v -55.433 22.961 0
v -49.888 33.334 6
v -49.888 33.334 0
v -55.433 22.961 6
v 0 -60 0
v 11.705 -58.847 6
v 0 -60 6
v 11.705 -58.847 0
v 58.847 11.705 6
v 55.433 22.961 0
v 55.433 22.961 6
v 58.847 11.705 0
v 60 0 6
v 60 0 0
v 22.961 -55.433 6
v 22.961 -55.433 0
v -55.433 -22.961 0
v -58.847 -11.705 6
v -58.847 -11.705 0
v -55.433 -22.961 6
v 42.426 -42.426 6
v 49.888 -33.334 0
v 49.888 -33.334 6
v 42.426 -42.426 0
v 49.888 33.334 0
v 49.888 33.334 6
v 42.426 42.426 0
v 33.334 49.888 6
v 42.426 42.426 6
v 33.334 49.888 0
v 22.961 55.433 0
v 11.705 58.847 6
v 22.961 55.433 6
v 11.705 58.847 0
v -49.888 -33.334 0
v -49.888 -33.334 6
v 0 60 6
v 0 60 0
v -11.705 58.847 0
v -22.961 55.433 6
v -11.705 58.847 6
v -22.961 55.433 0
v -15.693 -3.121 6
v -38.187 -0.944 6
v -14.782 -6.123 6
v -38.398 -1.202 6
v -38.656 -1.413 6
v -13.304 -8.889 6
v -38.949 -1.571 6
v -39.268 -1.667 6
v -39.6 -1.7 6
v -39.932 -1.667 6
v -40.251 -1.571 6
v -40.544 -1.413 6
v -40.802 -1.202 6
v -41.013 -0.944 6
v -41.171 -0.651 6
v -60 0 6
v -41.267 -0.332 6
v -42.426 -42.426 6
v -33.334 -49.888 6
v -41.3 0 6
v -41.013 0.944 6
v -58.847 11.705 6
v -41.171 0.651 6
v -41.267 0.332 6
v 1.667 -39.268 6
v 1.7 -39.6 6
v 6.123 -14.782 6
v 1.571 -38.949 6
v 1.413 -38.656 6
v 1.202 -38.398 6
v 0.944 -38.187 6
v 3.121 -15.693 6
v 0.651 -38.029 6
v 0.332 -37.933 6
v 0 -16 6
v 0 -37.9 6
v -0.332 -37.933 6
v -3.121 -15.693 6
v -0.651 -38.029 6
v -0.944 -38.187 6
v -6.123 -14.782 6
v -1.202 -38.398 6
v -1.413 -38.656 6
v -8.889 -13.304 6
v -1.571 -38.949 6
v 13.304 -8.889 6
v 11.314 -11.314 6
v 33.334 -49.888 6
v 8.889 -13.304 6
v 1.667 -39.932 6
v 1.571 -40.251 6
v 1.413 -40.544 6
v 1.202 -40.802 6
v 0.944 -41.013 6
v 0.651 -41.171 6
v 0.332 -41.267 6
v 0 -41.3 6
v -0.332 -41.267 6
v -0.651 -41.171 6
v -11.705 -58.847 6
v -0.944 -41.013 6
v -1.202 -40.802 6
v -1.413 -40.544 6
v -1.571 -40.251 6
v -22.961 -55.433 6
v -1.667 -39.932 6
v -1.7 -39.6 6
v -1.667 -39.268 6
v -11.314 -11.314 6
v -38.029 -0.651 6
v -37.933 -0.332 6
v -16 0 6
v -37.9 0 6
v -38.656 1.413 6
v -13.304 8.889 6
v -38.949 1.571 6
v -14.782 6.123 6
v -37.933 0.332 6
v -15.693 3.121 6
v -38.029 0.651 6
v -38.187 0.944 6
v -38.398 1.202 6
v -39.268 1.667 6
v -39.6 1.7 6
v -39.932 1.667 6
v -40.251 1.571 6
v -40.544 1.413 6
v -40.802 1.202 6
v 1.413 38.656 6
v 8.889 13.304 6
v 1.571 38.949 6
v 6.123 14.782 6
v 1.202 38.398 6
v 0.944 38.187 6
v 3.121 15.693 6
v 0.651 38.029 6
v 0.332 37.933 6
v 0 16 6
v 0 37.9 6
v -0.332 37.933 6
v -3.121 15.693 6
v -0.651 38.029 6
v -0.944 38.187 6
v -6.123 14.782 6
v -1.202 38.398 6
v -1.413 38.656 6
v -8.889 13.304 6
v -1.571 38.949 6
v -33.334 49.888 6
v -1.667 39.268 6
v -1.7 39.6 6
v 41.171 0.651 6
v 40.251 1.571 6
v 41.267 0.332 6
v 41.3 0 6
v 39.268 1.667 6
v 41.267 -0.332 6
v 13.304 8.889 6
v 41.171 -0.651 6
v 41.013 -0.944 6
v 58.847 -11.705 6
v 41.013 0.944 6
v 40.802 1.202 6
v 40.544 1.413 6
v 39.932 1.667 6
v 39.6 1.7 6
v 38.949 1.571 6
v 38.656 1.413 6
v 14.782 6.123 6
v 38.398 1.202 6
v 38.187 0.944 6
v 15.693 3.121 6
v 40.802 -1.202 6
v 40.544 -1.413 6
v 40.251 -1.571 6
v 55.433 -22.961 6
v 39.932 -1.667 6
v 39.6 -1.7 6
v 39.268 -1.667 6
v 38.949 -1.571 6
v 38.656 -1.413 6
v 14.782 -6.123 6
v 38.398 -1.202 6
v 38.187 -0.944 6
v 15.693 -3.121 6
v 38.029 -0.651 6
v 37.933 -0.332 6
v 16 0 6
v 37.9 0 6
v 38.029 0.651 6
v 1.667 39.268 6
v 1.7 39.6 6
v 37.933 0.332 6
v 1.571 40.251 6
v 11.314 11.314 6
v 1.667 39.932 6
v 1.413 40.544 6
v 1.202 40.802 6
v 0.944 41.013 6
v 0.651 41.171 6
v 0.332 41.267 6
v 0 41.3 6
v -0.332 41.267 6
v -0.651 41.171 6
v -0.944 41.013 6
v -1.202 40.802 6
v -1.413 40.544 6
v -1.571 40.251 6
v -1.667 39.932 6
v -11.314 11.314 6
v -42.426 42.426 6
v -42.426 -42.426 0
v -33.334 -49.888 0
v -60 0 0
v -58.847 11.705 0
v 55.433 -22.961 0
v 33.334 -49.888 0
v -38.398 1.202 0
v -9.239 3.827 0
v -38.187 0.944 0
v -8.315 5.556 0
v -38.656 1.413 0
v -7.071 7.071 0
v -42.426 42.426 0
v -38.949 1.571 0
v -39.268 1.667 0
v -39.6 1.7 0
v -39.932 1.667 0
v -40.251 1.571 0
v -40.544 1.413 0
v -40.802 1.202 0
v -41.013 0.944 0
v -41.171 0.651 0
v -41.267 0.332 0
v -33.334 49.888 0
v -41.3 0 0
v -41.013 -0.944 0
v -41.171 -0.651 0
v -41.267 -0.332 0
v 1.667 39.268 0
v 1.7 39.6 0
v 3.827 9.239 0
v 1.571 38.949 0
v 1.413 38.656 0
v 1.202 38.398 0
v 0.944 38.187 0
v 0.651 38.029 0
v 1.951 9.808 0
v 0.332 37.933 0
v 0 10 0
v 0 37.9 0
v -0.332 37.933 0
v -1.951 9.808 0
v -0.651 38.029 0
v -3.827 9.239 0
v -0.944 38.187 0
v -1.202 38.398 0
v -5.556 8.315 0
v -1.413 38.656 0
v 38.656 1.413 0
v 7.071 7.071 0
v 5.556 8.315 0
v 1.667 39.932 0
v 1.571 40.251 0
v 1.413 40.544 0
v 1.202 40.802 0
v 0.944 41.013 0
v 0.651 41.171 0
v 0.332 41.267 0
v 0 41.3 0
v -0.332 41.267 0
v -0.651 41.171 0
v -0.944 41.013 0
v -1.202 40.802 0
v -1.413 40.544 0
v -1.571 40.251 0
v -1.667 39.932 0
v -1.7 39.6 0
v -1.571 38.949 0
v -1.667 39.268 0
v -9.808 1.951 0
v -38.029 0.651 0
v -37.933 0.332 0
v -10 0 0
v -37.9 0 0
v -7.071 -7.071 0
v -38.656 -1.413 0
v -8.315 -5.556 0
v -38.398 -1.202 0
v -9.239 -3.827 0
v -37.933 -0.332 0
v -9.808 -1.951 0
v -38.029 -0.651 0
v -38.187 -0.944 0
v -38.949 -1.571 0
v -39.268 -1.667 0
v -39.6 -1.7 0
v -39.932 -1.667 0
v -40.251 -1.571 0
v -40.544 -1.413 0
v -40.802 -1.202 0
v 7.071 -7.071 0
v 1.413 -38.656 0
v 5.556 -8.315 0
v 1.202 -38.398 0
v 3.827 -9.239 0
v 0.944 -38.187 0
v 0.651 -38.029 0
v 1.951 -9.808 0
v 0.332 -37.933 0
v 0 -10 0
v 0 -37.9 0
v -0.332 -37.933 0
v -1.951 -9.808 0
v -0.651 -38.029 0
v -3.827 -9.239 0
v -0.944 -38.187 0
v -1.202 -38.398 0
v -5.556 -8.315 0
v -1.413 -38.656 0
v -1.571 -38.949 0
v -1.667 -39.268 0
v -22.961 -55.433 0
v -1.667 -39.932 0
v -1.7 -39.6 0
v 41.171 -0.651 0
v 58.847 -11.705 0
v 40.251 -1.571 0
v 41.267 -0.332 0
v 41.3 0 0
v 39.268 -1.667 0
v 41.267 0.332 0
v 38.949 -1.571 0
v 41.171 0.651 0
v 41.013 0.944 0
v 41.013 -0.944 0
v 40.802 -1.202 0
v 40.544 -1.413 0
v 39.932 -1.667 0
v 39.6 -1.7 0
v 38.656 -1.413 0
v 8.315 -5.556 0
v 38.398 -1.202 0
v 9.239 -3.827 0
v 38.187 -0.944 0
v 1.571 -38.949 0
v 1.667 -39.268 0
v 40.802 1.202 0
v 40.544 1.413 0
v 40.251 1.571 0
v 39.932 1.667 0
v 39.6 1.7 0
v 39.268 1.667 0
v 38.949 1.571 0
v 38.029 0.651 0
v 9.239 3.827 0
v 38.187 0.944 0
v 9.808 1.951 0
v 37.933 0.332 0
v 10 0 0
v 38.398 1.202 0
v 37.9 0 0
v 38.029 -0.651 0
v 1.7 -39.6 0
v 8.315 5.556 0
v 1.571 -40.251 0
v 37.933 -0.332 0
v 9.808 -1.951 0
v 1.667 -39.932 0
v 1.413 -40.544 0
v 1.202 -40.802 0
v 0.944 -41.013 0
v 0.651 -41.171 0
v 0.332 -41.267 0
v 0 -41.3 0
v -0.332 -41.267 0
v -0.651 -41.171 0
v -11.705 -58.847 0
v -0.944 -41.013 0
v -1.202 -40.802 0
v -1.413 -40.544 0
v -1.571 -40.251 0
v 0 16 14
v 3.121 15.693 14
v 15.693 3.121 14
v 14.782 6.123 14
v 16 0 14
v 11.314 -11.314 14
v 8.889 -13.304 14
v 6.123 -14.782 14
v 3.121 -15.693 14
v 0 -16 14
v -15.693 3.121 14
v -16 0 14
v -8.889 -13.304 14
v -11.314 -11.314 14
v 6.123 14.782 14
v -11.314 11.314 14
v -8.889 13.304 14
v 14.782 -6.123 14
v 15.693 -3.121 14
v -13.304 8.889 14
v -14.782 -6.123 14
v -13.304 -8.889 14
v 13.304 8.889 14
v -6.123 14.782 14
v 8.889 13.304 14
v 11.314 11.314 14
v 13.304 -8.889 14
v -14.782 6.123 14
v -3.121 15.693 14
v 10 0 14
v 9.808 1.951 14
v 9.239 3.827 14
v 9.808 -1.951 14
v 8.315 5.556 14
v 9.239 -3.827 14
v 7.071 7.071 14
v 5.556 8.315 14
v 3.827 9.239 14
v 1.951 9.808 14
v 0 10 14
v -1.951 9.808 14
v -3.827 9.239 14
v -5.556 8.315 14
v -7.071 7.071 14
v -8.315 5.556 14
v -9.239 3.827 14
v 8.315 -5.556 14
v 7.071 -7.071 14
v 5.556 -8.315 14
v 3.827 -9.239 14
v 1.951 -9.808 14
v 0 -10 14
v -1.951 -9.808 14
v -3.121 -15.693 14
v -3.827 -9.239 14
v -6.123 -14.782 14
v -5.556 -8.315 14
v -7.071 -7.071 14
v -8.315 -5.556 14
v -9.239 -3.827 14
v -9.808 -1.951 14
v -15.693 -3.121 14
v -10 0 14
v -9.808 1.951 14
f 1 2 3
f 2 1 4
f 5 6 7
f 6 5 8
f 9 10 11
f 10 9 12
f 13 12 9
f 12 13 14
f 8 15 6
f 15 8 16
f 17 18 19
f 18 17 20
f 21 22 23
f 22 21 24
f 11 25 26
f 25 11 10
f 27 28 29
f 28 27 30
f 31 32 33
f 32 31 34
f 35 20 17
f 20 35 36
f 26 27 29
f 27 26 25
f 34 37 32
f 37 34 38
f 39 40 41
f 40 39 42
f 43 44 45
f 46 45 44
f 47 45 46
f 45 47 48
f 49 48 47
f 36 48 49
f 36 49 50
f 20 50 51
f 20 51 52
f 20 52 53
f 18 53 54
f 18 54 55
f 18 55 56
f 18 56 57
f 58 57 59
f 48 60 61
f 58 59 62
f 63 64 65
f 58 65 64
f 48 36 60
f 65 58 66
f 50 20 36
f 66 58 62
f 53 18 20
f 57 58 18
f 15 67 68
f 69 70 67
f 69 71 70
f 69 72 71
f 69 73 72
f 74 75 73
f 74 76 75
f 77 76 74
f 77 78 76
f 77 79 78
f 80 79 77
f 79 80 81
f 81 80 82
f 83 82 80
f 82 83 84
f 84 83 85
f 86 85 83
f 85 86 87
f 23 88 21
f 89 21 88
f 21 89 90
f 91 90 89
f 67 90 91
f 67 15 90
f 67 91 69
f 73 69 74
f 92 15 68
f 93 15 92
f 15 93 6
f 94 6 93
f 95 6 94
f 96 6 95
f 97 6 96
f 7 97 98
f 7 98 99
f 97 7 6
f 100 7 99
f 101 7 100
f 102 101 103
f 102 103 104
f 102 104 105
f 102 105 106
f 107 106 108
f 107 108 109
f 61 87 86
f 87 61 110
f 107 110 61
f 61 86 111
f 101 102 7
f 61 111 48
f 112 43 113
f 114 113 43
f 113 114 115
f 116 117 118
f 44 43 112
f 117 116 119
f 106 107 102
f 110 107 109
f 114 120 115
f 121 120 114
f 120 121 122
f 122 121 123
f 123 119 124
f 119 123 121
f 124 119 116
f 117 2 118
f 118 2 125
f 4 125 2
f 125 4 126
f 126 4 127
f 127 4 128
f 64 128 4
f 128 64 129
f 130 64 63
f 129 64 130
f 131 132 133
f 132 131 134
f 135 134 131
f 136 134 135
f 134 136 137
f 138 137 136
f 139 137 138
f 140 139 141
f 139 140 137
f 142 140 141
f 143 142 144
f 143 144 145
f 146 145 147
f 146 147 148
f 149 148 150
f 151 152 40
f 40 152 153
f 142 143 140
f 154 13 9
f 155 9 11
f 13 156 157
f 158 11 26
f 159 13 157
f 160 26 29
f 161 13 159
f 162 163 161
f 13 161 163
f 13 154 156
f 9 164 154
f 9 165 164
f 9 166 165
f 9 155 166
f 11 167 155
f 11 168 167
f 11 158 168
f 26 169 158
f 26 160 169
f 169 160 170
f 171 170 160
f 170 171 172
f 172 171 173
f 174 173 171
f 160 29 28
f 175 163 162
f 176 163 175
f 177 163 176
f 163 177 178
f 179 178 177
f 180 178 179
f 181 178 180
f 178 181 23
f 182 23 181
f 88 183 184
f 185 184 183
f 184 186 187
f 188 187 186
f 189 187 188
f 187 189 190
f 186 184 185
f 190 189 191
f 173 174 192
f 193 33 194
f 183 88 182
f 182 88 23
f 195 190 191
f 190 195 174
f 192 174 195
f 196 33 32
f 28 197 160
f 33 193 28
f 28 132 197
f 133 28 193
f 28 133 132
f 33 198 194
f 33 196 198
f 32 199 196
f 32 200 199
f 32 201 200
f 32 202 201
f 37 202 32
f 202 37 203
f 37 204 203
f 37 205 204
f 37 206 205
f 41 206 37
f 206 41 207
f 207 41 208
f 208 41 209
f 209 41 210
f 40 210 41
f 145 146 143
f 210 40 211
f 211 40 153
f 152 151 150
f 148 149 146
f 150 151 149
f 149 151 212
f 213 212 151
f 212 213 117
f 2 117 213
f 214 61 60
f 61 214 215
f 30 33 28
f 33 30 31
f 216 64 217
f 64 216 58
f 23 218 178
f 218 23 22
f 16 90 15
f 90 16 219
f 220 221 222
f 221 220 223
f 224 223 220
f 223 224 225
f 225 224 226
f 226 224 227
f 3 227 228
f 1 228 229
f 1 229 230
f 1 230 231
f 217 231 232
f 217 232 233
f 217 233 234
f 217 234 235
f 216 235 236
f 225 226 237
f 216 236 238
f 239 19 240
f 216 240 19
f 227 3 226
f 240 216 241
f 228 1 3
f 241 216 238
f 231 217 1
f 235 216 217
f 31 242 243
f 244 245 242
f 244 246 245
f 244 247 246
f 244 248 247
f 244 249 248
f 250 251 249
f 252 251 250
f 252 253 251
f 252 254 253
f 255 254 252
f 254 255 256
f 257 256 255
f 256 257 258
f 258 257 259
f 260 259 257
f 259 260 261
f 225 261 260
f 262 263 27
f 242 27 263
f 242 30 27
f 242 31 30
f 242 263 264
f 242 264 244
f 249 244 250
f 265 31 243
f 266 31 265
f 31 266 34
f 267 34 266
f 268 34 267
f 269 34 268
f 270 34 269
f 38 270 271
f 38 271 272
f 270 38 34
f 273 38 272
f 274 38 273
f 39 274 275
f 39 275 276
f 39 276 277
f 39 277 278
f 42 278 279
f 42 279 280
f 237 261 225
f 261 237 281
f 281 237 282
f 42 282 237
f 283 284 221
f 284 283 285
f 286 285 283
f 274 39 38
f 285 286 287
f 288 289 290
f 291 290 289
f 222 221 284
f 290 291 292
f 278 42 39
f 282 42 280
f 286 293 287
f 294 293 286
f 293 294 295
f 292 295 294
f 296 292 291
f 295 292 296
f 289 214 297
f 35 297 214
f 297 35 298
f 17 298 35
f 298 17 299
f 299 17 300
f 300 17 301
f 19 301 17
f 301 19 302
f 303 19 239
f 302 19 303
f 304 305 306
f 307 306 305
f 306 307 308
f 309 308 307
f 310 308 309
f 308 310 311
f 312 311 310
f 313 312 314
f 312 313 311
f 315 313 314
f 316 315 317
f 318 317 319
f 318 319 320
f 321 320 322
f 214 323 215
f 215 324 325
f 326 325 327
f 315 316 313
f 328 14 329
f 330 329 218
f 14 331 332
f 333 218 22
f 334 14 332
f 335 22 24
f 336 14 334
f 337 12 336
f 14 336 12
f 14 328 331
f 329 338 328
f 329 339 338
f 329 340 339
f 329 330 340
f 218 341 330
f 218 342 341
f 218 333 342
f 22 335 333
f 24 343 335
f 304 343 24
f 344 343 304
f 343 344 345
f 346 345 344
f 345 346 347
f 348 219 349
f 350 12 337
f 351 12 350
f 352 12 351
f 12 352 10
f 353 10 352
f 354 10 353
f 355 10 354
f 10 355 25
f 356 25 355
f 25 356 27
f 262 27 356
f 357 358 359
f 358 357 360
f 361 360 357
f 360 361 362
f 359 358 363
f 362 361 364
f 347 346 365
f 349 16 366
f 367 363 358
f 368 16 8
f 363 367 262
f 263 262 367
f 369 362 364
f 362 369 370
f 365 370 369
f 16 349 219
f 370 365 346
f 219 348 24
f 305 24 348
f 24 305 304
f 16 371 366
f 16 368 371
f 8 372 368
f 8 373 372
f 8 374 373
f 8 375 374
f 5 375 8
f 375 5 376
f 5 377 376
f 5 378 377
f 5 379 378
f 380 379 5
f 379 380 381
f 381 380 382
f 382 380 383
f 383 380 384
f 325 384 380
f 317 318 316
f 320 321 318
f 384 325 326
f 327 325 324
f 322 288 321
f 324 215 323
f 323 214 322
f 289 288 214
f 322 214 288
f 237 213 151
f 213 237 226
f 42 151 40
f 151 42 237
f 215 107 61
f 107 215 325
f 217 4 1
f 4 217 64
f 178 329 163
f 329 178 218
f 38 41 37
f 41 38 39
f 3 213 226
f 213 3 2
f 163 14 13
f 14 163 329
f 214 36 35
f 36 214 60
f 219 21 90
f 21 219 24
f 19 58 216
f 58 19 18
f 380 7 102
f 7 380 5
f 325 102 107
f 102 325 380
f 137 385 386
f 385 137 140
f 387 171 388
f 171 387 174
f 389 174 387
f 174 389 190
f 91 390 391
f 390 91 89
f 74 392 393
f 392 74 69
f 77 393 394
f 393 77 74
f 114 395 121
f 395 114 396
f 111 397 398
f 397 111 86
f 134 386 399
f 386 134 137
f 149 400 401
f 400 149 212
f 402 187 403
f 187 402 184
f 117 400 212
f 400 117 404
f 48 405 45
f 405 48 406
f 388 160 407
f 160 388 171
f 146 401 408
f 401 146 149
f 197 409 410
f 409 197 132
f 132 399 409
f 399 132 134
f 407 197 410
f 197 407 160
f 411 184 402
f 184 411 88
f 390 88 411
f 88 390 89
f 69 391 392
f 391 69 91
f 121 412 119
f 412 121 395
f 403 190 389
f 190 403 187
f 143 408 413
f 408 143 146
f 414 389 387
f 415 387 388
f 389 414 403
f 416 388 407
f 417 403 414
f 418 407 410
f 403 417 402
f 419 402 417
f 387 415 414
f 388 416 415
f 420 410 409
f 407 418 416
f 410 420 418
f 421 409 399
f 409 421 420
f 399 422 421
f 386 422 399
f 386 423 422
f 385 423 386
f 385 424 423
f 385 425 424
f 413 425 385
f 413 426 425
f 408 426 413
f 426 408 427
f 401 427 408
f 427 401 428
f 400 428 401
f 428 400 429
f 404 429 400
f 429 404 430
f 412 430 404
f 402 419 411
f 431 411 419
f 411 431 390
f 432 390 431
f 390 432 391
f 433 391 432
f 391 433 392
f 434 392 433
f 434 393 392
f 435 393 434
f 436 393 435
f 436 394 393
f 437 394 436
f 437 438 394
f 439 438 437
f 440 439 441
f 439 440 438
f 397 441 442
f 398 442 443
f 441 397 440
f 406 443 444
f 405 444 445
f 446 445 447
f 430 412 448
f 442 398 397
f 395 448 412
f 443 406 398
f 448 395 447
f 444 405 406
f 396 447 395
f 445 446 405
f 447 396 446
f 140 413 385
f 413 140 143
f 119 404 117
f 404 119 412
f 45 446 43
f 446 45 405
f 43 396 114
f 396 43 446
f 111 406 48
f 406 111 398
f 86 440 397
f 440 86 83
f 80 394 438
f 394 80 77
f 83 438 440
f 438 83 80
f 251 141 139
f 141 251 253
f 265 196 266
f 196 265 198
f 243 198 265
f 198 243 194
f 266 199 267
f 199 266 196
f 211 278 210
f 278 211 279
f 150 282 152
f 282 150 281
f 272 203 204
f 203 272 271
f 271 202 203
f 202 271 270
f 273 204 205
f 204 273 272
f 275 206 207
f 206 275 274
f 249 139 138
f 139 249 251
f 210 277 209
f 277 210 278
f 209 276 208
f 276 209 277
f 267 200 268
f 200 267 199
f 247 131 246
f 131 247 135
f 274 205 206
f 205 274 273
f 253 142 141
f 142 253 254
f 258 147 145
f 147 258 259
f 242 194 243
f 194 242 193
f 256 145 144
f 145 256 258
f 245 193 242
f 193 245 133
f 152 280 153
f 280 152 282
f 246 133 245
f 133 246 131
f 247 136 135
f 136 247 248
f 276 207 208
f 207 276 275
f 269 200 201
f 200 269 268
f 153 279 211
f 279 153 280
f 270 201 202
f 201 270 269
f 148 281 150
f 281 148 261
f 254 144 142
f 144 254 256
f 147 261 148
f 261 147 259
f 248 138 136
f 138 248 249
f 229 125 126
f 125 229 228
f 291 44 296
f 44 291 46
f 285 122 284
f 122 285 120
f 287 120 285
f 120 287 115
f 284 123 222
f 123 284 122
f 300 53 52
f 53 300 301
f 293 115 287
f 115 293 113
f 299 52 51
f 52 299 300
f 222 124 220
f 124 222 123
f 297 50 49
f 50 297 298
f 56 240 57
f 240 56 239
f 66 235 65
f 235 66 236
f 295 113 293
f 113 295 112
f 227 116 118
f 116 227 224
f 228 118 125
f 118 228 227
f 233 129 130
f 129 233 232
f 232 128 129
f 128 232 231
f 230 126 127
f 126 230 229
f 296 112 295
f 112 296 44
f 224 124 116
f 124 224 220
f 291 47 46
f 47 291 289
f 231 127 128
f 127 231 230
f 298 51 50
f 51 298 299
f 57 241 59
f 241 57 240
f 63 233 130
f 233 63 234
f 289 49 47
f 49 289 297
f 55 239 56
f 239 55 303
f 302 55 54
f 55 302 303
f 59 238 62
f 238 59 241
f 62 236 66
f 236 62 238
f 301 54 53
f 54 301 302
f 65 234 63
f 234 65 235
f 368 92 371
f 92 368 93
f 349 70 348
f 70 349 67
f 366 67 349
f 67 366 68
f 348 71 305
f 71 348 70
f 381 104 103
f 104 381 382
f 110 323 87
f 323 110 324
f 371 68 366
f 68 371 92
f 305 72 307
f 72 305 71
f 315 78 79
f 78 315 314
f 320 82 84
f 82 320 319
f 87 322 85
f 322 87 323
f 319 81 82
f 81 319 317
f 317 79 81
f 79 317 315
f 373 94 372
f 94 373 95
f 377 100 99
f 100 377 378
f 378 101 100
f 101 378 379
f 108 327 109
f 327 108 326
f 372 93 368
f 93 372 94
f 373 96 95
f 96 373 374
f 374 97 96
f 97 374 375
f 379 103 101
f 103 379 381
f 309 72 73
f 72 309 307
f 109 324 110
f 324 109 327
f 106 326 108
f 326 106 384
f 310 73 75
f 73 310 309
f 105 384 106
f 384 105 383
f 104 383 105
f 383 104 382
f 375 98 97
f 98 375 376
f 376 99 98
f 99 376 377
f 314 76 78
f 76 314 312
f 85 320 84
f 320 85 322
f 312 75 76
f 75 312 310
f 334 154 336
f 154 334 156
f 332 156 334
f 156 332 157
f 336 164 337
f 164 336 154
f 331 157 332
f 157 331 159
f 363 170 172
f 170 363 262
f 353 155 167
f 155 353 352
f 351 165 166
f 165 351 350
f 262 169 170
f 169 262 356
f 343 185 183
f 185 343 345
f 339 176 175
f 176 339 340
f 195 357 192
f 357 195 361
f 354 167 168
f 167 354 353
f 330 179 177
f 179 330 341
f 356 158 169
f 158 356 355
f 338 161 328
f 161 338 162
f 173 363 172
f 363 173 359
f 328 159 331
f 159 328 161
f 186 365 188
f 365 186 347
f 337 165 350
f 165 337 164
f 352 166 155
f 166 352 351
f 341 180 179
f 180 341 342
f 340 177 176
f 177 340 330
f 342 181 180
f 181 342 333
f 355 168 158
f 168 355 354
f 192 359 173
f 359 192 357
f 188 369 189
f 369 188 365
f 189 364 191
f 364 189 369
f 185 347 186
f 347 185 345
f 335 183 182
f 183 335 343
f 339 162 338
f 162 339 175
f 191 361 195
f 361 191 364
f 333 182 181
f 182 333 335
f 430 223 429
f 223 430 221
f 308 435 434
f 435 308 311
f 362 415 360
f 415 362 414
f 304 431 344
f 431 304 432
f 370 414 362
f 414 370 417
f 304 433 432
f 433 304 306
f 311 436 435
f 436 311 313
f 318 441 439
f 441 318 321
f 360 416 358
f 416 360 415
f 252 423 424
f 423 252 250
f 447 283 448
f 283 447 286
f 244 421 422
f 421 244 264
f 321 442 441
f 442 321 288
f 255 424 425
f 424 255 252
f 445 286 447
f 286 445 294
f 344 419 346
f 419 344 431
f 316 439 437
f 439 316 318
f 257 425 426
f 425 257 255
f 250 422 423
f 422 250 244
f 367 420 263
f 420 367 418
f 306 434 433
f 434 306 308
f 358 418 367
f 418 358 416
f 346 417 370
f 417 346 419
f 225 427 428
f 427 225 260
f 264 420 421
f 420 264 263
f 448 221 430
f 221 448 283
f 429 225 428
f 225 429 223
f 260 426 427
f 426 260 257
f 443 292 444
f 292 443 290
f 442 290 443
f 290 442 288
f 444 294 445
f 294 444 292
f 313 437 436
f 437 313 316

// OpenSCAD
$fn = 32;

// ----------------------------------------------------------------------
// Flange Ø120 x 6
// 4 holes on a Ø79.2 bolt circle, bolted joints
// ----------------------------------------------------------------------

// --- parameters (mm) ---
flange_d = 120;  // outside diameter of the flange
thickness = 6;   // flange thickness
holes = 4;       // number of bolt holes
pcd = 79.2;      // bolt circle diameter
start_deg = 90;  // angle of the first hole, from +X
hole_d = 3.4;    // bolt hole diameter
bore_d = 20;     // central through bore
hub_d = 32;      // hub outside diameter
hub_h = 8;       // hub height above the flange face (0 = no hub)

// --- derived feature positions (mm) ---
height = thickness + hub_h;  // = 14   overall height of the part
pcd_r = pcd / 2;             // = 39.6   bolt circle radius
hole_step = 360 / holes;     // = 90   angular pitch
feature_centers = [
  [pcd_r * cos(start_deg + 0 * hole_step), pcd_r * sin(start_deg + 0 * hole_step)],
  [pcd_r * cos(start_deg + 1 * hole_step), pcd_r * sin(start_deg + 1 * hole_step)],
  [pcd_r * cos(start_deg + 2 * hole_step), pcd_r * sin(start_deg + 2 * hole_step)],
  [pcd_r * cos(start_deg + 3 * hole_step), pcd_r * sin(start_deg + 3 * hole_step)]
];   // bolt hole centres on the pitch circle

// flange disc, every hole and the bore cut straight through
difference() {
  union() {
    cylinder(d = flange_d, h = thickness);
    cylinder(d = hub_d, h = height);  // hub, overlapped into the flange
  }
  translate([0, 0, -1]) cylinder(d = bore_d, h = height + 2);  // bore, through
  for (centre = feature_centers)
    translate([centre[0], centre[1], -1]) cylinder(d = hole_d, h = thickness + 2);
}
